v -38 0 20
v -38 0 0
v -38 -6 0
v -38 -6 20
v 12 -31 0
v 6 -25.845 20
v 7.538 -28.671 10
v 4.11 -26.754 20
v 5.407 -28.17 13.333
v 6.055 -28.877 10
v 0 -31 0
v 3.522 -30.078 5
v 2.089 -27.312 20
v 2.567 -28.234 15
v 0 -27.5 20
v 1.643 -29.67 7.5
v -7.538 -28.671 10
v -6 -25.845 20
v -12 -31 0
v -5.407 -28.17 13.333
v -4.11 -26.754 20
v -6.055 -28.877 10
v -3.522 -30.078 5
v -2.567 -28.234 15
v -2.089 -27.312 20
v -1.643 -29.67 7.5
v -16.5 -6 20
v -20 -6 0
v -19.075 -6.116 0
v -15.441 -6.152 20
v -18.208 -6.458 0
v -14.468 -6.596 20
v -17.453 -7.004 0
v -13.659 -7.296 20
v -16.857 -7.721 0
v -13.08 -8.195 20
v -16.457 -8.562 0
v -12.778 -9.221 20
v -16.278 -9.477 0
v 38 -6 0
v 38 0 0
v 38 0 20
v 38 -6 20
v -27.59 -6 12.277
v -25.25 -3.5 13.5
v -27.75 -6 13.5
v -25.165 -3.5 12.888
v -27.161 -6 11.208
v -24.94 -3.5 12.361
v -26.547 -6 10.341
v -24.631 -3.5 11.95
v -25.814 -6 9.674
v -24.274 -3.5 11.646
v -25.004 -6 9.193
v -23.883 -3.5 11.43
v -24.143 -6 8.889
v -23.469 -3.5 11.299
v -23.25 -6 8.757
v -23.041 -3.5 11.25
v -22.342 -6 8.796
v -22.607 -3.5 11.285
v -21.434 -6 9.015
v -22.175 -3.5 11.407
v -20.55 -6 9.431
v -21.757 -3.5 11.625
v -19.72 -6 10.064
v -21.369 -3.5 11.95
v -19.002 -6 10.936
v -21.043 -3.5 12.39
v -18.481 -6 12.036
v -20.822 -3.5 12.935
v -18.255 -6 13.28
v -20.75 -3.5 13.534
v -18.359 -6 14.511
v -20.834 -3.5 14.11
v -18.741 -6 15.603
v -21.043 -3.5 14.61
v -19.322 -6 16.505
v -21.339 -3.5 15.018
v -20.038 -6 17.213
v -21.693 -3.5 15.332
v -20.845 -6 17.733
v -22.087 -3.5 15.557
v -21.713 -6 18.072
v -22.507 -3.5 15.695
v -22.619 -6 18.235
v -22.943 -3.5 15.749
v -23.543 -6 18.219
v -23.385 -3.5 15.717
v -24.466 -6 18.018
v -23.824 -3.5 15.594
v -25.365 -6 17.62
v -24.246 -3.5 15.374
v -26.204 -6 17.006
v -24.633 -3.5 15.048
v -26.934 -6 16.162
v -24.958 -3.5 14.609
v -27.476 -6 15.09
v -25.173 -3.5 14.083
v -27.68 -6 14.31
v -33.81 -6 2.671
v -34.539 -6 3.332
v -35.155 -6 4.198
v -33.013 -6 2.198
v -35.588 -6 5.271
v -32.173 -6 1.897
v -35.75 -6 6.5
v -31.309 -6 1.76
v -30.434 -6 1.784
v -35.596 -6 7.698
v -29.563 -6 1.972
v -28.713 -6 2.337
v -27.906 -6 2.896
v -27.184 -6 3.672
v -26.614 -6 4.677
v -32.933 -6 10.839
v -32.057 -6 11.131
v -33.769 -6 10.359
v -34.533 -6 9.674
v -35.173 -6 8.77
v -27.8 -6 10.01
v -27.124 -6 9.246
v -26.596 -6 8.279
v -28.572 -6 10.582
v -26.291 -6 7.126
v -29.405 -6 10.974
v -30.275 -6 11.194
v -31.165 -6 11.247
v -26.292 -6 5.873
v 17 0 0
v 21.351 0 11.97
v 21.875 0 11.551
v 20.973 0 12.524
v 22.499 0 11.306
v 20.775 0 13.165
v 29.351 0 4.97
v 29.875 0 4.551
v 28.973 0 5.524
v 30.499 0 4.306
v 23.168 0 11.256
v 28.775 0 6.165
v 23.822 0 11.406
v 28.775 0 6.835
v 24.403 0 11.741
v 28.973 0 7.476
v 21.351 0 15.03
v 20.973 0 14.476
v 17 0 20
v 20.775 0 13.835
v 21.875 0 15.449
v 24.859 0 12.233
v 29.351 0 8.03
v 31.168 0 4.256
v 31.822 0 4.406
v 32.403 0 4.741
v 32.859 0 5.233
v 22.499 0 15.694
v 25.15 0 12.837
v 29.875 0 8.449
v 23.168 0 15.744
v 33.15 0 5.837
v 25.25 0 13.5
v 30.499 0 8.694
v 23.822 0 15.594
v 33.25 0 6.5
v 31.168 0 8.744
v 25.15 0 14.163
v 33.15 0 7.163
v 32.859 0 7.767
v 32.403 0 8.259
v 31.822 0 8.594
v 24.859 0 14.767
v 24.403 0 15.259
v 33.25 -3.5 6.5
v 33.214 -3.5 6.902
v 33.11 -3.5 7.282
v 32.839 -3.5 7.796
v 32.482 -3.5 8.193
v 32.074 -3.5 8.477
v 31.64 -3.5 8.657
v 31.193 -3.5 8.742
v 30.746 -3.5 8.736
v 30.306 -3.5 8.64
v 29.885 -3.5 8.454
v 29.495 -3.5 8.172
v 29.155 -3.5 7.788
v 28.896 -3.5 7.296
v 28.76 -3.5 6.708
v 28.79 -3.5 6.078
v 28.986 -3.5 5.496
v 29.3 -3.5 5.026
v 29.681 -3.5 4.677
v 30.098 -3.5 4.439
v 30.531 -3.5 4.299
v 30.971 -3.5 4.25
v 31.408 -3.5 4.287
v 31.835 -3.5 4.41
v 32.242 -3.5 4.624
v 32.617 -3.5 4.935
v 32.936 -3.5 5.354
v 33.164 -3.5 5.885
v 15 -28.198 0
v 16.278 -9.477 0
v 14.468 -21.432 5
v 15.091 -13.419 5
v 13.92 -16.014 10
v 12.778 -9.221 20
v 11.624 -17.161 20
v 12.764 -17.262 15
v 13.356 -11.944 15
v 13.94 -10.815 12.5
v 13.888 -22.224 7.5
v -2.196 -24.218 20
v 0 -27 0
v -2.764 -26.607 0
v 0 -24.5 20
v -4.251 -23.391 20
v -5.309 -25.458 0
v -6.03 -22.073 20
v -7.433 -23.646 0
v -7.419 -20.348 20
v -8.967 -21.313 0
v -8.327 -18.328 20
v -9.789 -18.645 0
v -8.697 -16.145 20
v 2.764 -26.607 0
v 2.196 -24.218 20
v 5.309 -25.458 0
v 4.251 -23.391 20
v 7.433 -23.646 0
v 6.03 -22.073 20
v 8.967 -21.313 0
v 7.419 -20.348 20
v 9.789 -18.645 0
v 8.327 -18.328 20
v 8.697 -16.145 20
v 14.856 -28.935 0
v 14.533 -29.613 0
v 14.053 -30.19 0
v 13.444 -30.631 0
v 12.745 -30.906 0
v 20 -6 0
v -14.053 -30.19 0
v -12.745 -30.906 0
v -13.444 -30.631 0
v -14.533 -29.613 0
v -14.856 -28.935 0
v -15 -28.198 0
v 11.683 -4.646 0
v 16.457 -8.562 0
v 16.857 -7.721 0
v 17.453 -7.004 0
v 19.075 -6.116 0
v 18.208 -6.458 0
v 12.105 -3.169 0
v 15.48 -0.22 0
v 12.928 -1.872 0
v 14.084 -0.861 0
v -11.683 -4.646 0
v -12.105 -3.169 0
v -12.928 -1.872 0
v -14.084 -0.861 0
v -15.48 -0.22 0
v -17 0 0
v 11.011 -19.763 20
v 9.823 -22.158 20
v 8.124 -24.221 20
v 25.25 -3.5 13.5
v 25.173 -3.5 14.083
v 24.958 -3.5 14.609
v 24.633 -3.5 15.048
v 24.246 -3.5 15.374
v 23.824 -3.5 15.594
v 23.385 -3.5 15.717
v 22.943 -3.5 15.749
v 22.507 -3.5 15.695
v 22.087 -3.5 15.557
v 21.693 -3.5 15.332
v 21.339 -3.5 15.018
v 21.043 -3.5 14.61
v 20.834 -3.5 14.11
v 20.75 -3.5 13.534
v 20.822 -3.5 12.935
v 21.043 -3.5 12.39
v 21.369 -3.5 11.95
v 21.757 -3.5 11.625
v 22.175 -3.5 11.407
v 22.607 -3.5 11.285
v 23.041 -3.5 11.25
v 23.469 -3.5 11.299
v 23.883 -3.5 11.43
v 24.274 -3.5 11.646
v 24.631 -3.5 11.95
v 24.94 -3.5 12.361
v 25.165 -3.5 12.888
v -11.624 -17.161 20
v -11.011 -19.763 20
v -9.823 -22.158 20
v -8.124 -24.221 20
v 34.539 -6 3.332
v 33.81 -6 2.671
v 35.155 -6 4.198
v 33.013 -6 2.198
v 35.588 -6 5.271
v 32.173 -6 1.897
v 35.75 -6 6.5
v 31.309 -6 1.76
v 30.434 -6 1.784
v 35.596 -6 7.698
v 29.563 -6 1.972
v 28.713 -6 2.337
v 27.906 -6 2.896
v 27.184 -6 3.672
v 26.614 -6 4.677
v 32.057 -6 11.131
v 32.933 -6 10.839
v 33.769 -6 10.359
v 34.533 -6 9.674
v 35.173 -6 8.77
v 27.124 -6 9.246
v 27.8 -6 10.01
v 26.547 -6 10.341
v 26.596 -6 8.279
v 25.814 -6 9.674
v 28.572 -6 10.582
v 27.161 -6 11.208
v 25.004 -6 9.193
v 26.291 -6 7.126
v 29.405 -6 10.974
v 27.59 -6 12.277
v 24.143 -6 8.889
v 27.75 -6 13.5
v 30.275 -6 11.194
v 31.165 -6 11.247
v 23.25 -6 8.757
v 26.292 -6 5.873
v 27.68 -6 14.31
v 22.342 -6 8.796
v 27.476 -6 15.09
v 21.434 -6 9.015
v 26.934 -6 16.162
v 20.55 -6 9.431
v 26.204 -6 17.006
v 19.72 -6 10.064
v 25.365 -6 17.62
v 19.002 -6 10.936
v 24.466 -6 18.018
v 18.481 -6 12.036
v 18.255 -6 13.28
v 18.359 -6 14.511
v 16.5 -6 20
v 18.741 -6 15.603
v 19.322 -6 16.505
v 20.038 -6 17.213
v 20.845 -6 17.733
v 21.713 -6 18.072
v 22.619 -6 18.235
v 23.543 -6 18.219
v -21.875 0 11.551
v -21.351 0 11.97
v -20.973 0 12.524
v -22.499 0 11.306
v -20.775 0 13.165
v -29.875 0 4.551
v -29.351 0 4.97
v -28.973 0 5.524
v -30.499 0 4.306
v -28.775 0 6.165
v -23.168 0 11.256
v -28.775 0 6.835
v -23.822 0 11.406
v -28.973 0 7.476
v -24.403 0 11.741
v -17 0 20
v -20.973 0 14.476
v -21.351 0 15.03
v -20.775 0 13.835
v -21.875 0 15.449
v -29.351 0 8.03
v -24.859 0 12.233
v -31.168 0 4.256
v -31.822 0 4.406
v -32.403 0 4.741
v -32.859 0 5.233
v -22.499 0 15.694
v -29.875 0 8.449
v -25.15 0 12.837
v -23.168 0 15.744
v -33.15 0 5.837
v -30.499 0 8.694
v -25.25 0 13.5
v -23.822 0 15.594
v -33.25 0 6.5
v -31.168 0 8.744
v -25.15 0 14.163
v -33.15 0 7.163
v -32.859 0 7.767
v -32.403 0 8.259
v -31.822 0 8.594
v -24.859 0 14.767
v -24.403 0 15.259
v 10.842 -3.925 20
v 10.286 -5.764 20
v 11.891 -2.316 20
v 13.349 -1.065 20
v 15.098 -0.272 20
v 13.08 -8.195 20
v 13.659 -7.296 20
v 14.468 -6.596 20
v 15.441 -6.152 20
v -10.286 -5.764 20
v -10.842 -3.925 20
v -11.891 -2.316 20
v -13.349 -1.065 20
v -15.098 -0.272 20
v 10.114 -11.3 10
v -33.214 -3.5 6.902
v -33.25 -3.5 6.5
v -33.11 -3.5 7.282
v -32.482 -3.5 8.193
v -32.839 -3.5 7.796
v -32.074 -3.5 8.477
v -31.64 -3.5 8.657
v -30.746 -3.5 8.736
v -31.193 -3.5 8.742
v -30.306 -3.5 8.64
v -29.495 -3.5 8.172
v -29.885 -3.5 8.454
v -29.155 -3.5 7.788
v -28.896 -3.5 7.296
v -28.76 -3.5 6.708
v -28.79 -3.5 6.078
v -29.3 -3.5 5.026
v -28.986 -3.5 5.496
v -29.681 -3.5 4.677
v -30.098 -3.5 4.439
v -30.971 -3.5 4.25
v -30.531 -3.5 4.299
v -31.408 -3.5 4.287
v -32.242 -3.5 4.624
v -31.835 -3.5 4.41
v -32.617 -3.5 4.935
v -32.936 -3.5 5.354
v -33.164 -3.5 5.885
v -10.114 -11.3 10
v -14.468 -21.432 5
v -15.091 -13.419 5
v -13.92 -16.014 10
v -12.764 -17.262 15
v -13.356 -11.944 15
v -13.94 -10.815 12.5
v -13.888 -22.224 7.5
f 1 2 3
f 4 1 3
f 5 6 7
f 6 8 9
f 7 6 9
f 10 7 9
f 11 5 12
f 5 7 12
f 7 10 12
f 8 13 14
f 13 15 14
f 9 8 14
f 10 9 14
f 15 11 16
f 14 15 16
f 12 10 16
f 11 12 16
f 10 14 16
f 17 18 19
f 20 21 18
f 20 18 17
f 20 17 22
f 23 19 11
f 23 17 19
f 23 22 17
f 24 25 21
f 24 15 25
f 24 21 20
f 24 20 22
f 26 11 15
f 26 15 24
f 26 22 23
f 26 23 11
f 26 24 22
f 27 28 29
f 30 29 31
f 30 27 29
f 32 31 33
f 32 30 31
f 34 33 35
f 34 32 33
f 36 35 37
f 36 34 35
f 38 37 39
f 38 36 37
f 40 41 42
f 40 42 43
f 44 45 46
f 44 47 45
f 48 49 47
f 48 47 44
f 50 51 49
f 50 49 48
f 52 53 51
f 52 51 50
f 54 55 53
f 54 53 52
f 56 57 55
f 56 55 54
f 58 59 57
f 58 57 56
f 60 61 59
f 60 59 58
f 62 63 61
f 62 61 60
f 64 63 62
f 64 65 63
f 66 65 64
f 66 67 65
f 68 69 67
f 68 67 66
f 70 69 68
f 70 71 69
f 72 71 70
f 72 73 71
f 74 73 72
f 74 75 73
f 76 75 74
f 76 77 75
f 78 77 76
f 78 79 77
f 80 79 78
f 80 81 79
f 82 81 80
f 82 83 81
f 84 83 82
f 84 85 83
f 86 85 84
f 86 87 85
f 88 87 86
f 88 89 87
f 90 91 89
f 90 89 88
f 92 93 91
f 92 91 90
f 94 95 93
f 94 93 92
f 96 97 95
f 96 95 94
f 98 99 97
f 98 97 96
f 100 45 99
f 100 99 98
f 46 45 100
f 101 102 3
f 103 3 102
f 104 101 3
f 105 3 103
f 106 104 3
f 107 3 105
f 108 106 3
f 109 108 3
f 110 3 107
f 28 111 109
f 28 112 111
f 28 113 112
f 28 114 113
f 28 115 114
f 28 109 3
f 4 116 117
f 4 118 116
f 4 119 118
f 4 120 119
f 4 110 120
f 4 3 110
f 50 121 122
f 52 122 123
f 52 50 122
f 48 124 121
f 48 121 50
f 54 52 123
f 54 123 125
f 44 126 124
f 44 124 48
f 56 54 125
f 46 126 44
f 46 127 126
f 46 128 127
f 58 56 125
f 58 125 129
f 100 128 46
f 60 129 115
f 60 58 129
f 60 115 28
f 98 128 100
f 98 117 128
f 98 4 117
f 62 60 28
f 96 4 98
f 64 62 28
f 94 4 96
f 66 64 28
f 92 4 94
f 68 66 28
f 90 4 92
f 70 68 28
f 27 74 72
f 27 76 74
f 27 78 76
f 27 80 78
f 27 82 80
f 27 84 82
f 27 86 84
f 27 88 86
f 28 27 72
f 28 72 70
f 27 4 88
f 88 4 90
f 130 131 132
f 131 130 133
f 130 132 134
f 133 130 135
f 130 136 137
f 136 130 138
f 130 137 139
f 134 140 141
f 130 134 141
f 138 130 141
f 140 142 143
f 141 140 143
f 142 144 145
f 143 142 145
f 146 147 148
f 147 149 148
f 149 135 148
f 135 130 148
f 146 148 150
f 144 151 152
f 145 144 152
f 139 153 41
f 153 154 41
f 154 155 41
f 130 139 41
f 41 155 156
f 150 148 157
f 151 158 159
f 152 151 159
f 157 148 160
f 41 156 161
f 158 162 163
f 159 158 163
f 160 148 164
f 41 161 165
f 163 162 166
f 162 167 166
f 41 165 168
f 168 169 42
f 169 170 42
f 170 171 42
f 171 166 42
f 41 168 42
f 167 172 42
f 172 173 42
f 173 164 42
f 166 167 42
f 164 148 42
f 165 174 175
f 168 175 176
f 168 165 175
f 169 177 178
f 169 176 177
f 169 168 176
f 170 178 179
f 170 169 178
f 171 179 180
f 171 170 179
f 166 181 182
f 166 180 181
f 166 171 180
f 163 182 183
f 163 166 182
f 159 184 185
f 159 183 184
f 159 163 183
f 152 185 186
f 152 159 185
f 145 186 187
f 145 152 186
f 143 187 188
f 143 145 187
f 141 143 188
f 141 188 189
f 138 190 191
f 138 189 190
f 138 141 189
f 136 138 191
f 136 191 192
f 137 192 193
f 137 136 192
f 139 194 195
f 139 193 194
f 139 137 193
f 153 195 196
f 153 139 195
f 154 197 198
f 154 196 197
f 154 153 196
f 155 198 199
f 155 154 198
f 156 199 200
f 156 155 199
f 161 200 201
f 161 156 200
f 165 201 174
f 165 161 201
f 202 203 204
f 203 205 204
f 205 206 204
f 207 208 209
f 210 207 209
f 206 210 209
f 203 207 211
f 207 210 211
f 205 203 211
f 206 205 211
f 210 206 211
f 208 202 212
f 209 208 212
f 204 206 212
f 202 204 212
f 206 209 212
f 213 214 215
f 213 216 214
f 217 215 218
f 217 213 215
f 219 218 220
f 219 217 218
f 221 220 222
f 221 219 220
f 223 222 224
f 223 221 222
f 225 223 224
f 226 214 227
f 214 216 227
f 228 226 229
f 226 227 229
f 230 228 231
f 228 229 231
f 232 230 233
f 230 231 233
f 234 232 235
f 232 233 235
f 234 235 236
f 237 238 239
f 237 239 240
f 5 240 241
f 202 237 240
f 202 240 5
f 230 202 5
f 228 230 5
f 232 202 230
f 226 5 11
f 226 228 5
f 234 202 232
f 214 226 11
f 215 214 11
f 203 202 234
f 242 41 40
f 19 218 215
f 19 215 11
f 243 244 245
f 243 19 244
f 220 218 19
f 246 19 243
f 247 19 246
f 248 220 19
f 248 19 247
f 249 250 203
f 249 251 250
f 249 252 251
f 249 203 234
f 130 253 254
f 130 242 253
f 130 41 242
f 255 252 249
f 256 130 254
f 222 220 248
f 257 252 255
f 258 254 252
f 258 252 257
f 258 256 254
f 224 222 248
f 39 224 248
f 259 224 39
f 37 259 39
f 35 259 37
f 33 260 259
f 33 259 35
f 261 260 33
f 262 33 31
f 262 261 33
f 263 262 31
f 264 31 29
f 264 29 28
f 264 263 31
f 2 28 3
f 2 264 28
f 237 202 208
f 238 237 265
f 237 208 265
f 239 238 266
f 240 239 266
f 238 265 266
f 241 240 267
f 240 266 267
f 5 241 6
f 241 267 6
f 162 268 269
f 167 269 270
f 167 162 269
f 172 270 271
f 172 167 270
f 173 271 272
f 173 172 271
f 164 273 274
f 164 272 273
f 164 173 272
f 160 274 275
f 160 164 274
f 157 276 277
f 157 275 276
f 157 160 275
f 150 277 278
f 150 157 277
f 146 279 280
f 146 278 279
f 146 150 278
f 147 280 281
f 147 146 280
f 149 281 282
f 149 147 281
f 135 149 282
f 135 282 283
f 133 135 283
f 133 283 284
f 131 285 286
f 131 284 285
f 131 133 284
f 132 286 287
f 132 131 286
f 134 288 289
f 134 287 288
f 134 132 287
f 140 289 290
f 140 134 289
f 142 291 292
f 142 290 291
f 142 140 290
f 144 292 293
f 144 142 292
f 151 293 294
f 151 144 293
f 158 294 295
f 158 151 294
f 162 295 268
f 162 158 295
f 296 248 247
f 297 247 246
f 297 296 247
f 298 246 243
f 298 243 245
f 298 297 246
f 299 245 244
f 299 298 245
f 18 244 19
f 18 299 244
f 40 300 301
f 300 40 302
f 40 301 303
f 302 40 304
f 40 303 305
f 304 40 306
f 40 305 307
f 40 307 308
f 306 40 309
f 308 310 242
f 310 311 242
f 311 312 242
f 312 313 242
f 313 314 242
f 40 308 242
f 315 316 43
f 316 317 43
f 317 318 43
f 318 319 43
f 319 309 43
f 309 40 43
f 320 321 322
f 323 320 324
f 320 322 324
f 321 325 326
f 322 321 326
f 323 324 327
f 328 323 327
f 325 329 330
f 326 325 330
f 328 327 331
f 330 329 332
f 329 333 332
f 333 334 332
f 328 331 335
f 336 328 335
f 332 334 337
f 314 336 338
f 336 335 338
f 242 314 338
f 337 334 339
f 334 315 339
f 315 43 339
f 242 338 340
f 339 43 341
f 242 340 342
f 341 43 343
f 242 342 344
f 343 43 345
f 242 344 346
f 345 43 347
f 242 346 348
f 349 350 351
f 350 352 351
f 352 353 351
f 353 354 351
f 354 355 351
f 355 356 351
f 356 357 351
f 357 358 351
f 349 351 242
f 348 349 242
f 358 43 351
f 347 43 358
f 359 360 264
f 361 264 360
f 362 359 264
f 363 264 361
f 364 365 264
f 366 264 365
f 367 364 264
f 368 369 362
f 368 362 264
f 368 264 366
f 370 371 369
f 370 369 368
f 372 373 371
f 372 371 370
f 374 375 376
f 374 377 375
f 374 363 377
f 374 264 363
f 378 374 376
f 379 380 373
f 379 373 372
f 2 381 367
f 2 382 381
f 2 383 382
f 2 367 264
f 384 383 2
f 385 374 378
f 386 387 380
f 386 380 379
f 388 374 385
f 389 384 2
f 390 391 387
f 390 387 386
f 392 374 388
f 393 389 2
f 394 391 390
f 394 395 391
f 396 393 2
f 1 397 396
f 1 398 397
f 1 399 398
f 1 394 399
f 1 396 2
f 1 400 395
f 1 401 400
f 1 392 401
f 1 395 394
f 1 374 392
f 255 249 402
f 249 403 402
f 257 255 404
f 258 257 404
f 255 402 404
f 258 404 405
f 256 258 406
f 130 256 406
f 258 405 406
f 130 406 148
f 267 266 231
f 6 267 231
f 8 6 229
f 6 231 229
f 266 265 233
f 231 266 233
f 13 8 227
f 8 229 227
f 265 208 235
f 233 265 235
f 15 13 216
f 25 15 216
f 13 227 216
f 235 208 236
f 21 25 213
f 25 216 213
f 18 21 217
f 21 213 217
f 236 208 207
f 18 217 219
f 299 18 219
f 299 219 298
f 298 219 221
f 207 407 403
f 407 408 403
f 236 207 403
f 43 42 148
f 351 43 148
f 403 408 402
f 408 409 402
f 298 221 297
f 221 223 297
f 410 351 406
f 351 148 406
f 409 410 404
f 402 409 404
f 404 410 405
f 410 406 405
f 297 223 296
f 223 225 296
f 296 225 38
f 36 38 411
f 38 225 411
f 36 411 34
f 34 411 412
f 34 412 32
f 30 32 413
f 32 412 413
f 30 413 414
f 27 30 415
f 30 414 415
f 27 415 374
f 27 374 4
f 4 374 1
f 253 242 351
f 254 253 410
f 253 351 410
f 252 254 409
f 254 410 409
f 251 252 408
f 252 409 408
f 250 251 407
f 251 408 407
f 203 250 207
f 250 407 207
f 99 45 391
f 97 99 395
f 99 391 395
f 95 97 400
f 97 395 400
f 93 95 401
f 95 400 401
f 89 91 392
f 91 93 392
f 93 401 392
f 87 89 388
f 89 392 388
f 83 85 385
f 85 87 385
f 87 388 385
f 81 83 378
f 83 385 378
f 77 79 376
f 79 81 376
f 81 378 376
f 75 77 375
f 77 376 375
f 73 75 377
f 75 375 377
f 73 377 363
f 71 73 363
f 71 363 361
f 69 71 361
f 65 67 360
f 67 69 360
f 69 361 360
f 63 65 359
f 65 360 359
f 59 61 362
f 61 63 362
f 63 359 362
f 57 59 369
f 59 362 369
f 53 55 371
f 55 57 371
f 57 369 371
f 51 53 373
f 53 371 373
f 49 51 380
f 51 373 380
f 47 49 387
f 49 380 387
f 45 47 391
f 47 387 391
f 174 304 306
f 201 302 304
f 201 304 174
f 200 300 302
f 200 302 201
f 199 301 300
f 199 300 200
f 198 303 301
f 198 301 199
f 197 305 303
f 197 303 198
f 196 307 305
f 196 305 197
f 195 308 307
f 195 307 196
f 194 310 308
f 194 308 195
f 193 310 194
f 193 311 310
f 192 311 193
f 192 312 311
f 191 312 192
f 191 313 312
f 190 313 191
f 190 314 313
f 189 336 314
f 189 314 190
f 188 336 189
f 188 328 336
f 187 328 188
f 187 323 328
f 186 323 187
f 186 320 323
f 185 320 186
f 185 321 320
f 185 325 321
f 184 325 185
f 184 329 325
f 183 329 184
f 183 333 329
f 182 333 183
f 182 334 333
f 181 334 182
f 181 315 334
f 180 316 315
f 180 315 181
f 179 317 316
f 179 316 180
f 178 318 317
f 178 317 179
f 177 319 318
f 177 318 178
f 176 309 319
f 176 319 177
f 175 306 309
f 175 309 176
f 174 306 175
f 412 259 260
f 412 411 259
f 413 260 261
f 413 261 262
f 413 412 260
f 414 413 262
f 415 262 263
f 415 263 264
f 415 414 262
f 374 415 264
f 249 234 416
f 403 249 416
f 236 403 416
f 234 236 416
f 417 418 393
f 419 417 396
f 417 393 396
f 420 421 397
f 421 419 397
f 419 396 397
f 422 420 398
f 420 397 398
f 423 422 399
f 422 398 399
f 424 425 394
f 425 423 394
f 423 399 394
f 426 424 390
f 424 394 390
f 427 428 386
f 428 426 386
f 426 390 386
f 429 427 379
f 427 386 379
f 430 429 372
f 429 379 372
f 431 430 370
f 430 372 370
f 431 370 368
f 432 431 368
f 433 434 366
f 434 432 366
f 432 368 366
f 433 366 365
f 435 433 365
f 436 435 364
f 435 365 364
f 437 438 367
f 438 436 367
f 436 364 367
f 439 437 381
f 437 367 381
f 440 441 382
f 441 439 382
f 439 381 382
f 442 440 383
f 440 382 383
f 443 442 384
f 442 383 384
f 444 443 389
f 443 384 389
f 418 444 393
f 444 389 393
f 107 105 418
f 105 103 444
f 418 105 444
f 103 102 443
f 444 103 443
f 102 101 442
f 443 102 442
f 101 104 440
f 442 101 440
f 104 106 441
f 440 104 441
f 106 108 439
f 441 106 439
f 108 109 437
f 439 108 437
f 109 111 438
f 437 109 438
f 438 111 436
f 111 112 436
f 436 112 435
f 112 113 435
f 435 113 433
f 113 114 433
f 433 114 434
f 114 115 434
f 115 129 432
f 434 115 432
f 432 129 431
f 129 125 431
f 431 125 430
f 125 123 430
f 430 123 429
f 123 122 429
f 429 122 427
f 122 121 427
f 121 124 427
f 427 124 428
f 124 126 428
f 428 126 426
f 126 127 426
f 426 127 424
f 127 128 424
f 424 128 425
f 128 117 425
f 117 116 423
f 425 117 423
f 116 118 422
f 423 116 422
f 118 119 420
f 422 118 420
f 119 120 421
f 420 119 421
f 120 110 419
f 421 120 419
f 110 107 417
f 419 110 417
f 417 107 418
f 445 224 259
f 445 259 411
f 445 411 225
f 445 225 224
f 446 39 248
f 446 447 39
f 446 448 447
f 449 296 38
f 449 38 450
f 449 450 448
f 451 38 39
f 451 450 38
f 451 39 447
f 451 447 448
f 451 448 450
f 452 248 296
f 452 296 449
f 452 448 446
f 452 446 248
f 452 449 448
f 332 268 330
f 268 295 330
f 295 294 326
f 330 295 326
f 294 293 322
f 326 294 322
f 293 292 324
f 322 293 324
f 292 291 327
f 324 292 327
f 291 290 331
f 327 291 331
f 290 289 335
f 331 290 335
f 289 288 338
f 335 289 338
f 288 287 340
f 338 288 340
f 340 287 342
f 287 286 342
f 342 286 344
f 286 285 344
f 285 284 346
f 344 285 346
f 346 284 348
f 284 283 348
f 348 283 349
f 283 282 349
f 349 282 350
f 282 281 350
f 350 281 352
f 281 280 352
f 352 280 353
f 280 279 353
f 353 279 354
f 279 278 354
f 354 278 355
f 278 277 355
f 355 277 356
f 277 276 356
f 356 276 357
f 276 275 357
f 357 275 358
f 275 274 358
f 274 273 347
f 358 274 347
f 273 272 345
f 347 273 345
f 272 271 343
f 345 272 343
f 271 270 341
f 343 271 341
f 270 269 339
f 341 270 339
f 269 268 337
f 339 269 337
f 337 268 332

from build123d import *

# Parameters (mm, degrees)
SKETCH002_R  = 2.25
POCKET_DEPTH = 31.001
CHAMFER_SIZE = 2.5


with BuildPart() as chamfer_body:
    # Sketch → Loft section 0
    with BuildSketch(Plane.XY):
        with BuildLine():
            Line((-17, 0), (-38, 0))
            Line((-38, 0), (-38, -6))
            Line((-38, -6), (-20, -6))
            ThreePointArc((-16.27755, -9.477078), (-17.453105, -7.004482), (-20, -6))
            Line((-16.27755, -9.477078), (-15, -28.197751))
            ThreePointArc((-15, -28.197751), (-14.052596, -30.190467), (-12, -31))
            Line((-12, -31), (0, -31))
            Line((0, -31), (0, -27))
            ThreePointArc((-9.789322, -18.64486), (-6.435045, -24.627224), (0, -27))
            Line((-11.683183, -4.645958), (-9.789322, -18.64486))
            ThreePointArc((-11.683183, -4.645958), (-13.469651, -1.325133), (-17, 0))
        make_face()
    # Sketch001 → Loft section 1
    with BuildSketch(Plane.XY.offset(20)):
        with BuildLine():
            Line((-17, 0), (-38, 0))
            Line((-38, 0), (-38, -6))
            Line((-38, -6), (-16.5, -6))
            ThreePointArc((-12.77755, -9.220661), (-14.038837, -6.91692), (-16.5, -6))
            Line((-12.77755, -9.220661), (-11.623745, -17.1614))
            ThreePointArc((-11.623745, -17.1614), (-9.823458, -22.15833), (-6, -25.844998))
            ThreePointArc((-6, -25.844998), (-3.112034, -27.078665), (0, -27.5))
            Line((0, -27.5), (0, -24.5))
            ThreePointArc((-8.696641, -16.14486), (-6.029924, -22.072766), (0, -24.5))
            Line((-10.286118, -5.764115), (-8.696641, -16.14486))
            ThreePointArc((-10.286118, -5.764115), (-12.575601, -1.638712), (-17, 0))
        make_face()
    loft()

    # Sketch002 → Pocket (cut, through all)
    with BuildSketch(Plane(origin=(0, 0, 0), x_dir=(-1, 0, 0), z_dir=(0, 1, 0))):
        with Locations((23, 13.5)):
            Circle(SKETCH002_R)
        with Locations((31, 6.5)):
            Circle(SKETCH002_R)
    extrude(amount=-POCKET_DEPTH, mode=Mode.SUBTRACT)

    # Chamfer
    chamfer_edges = [chamfer_body.edges().sort_by_distance(p)[0] for p in [
        (-21.369261, -6, 15.050223),
        (-24.630739, -6, 11.949777),
        (-28.776606, -6, 6.844988),
        (-33.223394, -6, 6.155012),
    ]]
    chamfer(chamfer_edges, length=CHAMFER_SIZE)


with BuildPart() as part_mirroring:
    # Part__Mirroring: instance of Chamfer body
    add(chamfer_body.part.mirror(Plane(origin=(0, 0, 0), x_dir=(0, -1, 0), z_dir=(1, 0, 0))))


with BuildPart() as fusion:
    # Fusion base: copy of Chamfer body
    add(chamfer_body.part)

    # Fusion: union Part__Mirroring
    add(part_mirroring.part)


solid = fusion.part
